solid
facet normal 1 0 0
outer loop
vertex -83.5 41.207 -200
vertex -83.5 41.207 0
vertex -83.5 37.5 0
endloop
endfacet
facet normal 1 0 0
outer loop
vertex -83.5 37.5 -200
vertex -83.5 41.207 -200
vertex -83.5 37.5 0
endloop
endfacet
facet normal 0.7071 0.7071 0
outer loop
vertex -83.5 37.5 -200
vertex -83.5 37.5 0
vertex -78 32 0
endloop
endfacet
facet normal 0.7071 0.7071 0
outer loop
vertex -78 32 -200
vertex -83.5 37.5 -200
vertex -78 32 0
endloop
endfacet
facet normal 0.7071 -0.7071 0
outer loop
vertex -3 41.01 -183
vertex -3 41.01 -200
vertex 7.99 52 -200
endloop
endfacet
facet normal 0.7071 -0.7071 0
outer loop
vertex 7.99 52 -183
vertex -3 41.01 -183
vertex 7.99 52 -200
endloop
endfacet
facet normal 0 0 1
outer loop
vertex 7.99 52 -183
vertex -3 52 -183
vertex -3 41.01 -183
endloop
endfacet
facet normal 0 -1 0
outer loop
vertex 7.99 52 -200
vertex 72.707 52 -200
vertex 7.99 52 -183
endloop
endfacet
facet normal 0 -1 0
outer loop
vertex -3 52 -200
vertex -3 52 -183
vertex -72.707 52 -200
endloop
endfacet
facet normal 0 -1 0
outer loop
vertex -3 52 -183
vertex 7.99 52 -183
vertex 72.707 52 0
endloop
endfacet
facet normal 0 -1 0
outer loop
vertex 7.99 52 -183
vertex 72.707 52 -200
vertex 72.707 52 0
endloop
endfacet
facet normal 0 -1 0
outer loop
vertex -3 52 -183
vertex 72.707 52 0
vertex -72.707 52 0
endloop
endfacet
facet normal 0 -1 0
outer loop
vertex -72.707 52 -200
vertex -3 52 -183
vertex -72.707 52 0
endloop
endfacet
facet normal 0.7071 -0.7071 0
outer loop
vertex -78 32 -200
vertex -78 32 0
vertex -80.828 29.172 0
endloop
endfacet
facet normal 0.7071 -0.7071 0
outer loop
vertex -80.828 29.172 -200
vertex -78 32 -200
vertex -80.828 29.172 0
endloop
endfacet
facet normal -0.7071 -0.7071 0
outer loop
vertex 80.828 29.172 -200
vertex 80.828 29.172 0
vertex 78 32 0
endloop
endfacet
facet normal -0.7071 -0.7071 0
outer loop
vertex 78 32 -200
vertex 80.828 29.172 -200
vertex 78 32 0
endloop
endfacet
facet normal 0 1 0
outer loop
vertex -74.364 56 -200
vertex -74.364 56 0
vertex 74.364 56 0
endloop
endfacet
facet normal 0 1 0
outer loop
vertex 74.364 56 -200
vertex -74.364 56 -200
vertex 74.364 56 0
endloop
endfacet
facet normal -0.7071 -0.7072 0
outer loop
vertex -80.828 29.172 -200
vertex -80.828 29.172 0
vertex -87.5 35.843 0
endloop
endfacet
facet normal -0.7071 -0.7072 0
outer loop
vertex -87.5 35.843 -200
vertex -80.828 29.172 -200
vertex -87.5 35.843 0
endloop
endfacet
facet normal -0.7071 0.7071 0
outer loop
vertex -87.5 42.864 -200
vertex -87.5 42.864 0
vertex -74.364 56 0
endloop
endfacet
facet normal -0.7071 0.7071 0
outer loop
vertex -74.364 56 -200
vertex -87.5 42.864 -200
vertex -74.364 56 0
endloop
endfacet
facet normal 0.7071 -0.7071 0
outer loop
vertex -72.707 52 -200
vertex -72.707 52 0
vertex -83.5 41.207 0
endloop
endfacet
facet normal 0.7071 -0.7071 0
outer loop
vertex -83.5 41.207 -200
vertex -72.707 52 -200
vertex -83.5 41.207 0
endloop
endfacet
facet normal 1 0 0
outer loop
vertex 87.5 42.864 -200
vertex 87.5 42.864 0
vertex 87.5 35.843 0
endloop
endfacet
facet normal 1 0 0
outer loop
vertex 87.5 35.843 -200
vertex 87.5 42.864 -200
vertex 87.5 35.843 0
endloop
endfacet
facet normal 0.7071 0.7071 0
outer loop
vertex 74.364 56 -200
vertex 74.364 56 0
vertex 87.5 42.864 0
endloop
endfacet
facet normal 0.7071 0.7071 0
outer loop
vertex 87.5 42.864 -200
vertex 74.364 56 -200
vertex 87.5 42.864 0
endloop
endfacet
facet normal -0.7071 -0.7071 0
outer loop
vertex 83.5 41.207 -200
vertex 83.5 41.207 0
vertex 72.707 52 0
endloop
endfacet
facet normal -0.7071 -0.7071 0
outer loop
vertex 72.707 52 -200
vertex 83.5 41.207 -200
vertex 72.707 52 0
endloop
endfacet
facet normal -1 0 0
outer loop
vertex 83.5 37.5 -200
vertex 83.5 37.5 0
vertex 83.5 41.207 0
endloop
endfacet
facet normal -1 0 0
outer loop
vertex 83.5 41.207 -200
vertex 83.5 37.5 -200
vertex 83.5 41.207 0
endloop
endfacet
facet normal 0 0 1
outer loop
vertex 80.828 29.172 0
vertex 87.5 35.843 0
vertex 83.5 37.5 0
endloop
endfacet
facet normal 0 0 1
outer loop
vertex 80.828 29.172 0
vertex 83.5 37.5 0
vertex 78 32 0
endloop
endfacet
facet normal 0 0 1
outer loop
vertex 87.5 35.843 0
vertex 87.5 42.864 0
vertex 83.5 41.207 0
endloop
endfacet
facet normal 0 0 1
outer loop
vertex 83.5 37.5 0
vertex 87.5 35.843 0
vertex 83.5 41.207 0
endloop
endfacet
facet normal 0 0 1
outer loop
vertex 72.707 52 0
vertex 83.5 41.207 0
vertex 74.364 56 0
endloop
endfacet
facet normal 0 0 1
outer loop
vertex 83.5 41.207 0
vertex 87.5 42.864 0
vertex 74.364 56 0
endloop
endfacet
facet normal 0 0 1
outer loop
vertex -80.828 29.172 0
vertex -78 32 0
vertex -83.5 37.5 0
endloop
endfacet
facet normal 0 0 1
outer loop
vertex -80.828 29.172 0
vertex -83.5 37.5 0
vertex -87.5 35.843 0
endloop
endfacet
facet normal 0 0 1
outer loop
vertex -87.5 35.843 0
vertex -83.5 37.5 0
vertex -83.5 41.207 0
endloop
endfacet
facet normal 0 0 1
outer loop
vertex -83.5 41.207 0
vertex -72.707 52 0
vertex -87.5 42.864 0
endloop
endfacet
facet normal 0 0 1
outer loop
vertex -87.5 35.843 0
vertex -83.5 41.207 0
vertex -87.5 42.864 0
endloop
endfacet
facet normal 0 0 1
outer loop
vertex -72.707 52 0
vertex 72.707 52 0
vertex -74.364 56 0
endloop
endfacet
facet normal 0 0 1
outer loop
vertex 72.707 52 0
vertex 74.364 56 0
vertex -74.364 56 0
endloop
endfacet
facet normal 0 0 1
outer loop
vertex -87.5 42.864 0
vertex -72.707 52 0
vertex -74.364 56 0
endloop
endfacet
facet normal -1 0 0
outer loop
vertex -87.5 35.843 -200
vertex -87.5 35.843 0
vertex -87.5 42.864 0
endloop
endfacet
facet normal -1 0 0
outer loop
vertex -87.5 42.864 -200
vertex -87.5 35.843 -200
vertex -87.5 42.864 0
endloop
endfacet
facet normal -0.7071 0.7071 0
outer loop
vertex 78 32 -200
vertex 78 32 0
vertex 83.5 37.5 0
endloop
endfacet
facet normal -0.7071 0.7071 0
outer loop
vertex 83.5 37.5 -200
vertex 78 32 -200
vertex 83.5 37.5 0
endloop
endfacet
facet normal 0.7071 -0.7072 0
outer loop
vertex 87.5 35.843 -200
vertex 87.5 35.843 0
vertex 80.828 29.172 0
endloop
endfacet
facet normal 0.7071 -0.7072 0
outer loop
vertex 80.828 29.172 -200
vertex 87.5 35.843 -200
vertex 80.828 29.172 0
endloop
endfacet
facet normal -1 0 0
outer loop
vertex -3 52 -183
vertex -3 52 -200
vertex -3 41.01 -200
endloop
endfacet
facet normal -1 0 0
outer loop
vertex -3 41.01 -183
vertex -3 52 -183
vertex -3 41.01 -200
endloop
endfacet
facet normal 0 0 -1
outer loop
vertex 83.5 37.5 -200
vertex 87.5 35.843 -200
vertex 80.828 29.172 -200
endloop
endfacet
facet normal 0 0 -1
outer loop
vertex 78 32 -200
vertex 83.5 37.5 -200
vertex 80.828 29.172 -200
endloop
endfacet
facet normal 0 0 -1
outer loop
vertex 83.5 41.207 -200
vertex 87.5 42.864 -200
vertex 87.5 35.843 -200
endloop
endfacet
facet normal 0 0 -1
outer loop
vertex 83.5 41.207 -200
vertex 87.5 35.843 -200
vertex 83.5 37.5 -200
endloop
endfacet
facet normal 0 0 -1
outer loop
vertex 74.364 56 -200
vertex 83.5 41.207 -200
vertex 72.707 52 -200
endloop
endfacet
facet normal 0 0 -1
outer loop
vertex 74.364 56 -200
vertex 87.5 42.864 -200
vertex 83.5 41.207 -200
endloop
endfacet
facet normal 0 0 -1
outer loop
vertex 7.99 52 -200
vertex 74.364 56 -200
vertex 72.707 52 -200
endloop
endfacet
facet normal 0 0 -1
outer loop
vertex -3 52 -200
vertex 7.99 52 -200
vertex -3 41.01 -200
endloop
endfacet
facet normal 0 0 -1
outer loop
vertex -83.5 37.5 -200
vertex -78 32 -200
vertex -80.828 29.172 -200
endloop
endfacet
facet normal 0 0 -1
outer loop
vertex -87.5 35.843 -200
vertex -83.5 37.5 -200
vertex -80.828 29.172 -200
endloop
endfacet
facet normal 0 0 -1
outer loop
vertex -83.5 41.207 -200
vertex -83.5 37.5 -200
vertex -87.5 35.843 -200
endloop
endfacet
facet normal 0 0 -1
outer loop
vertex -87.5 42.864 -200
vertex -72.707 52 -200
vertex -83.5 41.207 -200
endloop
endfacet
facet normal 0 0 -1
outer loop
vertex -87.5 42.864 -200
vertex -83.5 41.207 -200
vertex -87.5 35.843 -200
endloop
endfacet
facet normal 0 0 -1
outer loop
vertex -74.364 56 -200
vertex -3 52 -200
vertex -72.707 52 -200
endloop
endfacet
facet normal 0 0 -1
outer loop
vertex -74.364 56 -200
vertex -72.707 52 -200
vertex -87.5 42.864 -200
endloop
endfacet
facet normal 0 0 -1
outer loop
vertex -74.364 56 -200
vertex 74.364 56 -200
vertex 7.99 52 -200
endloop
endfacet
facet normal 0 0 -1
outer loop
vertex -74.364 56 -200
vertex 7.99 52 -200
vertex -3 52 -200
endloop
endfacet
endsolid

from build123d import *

# Parameters (mm, degrees)
EXTRUDE_1_DEPTH   = 200
EXTRUDE_1_2_DEPTH = 17


with BuildPart() as part:
    # 草图1 → Extrude 1 (new body)
    with BuildSketch(Plane.XY):
        Polygon((78, 32), (83.5, 37.5), (83.5, 41.207106781), (72.707106781, 52), (-72.707106781, 52), (-83.5, 41.207106781), (-83.5, 37.5), (-78, 32), (-80.828427125, 29.171572875), (-87.5, 35.843145751), (-87.5, 42.863961031), (-74.363961031, 56), (74.363961031, 56), (87.5, 42.863961031), (87.5, 35.843145751), (80.828427125, 29.171572875), align=None)
    extrude(amount=-EXTRUDE_1_DEPTH)

    # 草图2 → Extrude 1 2 (add)
    with BuildSketch(Plane(origin=(0, 0, -200), x_dir=(-1, 0, 0), z_dir=(0, 0, -1))):
        Polygon((-7.989949494, 52), (3, 52), (3, 41.010050506), align=None)
    extrude(amount=-EXTRUDE_1_2_DEPTH)


solid = part.part
